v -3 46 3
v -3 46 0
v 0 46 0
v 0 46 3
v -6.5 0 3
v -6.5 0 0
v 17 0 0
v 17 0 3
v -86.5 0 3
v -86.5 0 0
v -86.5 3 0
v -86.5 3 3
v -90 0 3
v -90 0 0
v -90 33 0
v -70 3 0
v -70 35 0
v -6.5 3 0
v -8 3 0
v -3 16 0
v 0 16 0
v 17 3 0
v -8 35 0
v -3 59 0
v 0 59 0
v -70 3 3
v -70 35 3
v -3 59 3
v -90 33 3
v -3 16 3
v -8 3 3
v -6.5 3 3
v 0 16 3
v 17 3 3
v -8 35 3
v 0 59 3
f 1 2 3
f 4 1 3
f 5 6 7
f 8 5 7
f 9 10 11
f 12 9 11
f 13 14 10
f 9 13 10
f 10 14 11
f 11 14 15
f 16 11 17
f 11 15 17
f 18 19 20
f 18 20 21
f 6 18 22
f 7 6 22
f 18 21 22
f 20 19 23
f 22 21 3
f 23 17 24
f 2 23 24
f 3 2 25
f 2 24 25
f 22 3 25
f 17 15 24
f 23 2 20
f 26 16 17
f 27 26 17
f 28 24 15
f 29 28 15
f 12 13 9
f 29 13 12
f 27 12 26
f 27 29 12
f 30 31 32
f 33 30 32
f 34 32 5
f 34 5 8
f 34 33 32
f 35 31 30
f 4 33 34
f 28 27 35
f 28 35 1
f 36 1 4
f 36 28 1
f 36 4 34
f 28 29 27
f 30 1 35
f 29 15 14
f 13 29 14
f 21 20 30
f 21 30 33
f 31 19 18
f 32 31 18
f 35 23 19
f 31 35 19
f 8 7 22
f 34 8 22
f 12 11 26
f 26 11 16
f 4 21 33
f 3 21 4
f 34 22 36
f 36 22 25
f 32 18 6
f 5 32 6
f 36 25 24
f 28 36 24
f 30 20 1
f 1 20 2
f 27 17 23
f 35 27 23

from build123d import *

# Parameters (mm, degrees)
SKETCH1_W           = 3
SKETCH1_H           = 30
BOSS_EXTRUDE1_DEPTH = 3


with BuildPart() as part:
    # Sketch1 → Boss-Extrude1 (new body)
    with BuildSketch(Plane.XY):
        Polygon((-90, 0), (-86.5, 0), (-86.5, 3), (-70, 3), (-70, 35), (-8, 35), (-8, 3), (-6.5, 3), (-6.5, 0), (17, 0), (17, 3), (0, 59), (-3, 59), (-90, 33), align=None)
        with Locations((-1.5, 31)):
            Rectangle(SKETCH1_W, SKETCH1_H, mode=Mode.SUBTRACT)
    extrude(amount=BOSS_EXTRUDE1_DEPTH)


solid = part.part
